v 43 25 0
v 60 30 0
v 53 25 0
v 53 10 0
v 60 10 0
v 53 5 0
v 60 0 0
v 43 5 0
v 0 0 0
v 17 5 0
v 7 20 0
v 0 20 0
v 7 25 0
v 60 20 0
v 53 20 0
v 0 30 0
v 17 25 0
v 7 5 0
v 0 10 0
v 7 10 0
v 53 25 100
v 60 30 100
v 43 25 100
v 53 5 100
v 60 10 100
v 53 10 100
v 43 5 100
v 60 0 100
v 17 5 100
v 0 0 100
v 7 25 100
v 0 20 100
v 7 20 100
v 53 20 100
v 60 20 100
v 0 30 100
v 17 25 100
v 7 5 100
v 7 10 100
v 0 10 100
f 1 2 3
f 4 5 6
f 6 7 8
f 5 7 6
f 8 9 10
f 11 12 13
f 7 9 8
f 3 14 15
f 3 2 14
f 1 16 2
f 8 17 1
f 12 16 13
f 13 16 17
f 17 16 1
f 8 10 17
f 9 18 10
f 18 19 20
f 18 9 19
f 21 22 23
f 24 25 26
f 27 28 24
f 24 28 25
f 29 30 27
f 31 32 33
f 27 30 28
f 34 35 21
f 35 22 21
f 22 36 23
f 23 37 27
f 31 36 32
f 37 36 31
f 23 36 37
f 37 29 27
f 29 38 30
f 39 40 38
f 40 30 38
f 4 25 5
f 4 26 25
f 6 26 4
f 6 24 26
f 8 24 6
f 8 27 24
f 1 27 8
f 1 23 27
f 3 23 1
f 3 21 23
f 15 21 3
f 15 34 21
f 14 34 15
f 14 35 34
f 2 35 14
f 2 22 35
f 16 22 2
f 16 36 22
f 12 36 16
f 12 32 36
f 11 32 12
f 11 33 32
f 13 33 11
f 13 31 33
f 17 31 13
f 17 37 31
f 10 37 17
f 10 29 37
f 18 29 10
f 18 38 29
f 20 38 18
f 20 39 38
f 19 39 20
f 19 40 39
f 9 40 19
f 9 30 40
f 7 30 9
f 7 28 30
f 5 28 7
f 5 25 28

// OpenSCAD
$fn = 32;

// ----------------------------------------------------------------------
// T-slot rail: 60 x 30 mm section, 100 mm long
// ----------------------------------------------------------------------

// --- parameters (mm) ---
profile_height = 100;     // extrusion height
profile_points = 20;      // points of the closed outline

profile = [[0, 0], [60, 0], [60, 10], [53, 10], [53, 5], [43, 5], [43, 25], [53, 25], [53, 20], [60, 20], [60, 30], [0, 30], [0, 20], [7, 20], [7, 25], [17, 25], [17, 5], [7, 5], [7, 10], [0, 10]];  // single closed polygon, 20 points, counter clockwise

// --- the one profile operation ---
linear_extrude(height = profile_height) polygon(points = profile);
